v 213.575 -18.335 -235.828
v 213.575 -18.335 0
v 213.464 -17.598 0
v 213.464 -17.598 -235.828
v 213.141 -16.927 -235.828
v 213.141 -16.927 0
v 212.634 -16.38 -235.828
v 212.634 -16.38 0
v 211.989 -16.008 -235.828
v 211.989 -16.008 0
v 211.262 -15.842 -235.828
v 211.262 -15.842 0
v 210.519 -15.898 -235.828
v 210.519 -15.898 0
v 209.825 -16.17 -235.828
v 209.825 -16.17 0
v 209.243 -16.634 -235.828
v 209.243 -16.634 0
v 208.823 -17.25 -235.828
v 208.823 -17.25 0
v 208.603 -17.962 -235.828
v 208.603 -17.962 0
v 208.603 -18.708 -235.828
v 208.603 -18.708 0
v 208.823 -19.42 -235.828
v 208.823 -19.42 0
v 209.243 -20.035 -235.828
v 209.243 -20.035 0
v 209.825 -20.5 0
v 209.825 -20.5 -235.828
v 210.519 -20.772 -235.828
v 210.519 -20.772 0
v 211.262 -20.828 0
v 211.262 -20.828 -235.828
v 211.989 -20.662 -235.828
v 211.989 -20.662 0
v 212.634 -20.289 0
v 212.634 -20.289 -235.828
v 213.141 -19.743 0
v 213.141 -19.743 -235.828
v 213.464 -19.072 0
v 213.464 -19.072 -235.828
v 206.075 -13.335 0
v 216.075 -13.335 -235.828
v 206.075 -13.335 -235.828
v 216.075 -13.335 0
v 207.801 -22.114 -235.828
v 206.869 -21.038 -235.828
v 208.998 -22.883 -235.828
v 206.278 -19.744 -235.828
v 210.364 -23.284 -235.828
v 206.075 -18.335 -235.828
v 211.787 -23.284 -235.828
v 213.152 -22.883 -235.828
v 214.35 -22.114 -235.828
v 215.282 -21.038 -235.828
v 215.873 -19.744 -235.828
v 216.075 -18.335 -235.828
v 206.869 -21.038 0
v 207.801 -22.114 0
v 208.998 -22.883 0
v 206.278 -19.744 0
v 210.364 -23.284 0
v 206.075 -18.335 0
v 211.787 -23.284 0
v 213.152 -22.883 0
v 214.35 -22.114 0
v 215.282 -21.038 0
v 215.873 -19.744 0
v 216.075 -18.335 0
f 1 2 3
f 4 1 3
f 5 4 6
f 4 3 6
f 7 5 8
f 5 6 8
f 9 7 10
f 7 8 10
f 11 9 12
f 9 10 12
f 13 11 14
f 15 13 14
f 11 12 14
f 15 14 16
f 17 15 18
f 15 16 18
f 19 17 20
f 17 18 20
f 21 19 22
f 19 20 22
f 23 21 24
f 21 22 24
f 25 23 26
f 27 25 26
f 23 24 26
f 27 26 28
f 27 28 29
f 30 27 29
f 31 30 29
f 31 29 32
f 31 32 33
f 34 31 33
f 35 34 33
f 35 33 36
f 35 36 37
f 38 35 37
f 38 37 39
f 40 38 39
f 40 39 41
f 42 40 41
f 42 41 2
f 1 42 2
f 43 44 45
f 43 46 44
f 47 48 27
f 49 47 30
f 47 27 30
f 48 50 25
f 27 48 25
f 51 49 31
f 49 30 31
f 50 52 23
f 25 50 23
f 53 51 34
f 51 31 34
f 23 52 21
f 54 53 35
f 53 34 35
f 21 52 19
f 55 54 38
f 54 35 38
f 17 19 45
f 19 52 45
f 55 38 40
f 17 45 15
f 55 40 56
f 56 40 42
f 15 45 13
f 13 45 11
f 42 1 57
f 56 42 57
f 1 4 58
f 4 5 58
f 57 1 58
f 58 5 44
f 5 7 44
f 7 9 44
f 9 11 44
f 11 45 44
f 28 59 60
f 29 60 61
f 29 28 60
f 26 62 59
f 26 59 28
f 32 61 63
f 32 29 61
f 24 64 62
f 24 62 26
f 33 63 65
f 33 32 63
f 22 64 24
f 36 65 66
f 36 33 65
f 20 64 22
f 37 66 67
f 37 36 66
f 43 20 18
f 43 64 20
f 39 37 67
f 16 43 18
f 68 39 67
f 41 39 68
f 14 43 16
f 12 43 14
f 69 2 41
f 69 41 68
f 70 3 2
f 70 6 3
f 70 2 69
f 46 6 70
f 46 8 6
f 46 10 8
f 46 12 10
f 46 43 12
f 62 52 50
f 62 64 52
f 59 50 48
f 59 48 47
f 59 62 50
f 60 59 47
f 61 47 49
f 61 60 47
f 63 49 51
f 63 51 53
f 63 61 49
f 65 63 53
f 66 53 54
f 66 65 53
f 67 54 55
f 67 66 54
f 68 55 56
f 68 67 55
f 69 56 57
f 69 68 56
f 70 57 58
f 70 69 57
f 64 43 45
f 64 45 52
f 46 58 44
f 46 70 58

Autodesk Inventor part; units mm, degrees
ref_plane "YZ Plane" through (0, 0, 0) normal (1, 0, 0) x (0, 1, 0)
ref_plane "XZ Plane" through (0, 0, 0) normal (0, 1, 0) x (-1, 0, 0)
ref_plane "Work Plane1" through (0, 0, 0) normal (0, 0, 1) x (1, 0, 0)
sketch "Sketch1" plane through (0, 0, 0) normal (0, 0, 1) x (1, 0, 0)
  line L0 (28.2, -13.1349) -> (28.2, -18.3349) projected
  arc A0 (17.8, -18.3349) -> (28.2, -18.3349) centre (23, -18.3349) ccw projected
  line L1 (17.8, -18.3349) -> (17.8, -13.1349) projected
  line L2 (17.8, -13.1349) -> (28.2, -13.1349) projected
  line L3 (205.8753, -18.3349) -> (205.8753, -13.1349) projected
  line L4 (205.8753, -13.1349) -> (216.2753, -13.1349) projected
  line L5 (216.2753, -13.1349) -> (216.2753, -18.3349) projected
  arc A1 (205.8753, -18.3349) -> (216.2753, -18.3349) centre (211.0753, -18.3349) ccw projected
  line L6 (226.007, -27.5) -> (182.0614, -27.5) projected
  line L7 (226.007, 5) -> (226.007, -27.5) projected
  line L8 (14, 5) -> (226.007, 5) projected
  line L9 (14, -27.5) -> (14, 5) projected
  line L10 (52.5458, -27.5) -> (14, -27.5) projected
  line L11 (105.8221, -25.5) -> (103.8221, -27.5) projected
  line L12 (105.8221, -25.5) -> (105.8221, -8.9699) projected
  line L13 (105.8221, -8.9699) -> (111.2221, -8.9699) projected
  line L14 (111.2221, -8.9699) -> (111.2221, -25.5) projected
  line L15 (113.2221, -27.5) -> (111.2221, -25.5) projected
  line L16 (151.8, -27.5) -> (113.2221, -27.5) projected
  line L17 (153.8, -25.5) -> (151.8, -27.5) projected
  line L18 (153.8, -25.5) -> (153.8, -8.9699) projected
  line L19 (153.8, -8.9699) -> (159.2, -8.9699) projected
  line L20 (159.2, -8.9699) -> (159.2, -19.6294) projected
  line L21 (216.0753, -18.3349) -> (216.0753, -13.3349)
  line L22 (216.0753, -13.3349) -> (206.0753, -13.3349)
  line L23 (206.0753, -13.3349) -> (206.0753, -18.3349)
  arc A2 (206.0753, -18.3349) -> (216.0753, -18.3349) centre (211.0753, -18.3349) ccw
  circle A3 centre (211.0753, -18.3349) radius 2.5
  line L24 (182.0614, -27.0054) -> (182.0614, -27.5) projected
  line L25 (52.5458, -27.5) -> (52.5458, -27.003) projected
  line L26 (52.5458, -27.003) -> (55.9407, -27.003) projected
  arc A4 (55.9407, -27.003) -> (66.5602, -14.9102) centre (55.9407, -16.2937) ccw projected
  line L27 (66.5602, -14.9102) -> (70.1135, -14.9102) projected
  line L28 (70.1135, -14.9102) -> (75.8231, -20.6198) projected
  arc A5 (72.9244, -27.5) -> (75.8231, -20.6198) centre (55.9407, -16.2937) ccw projected
  line L29 (103.8221, -27.5) -> (72.9244, -27.5) projected
  line L30 (159.2, -19.6294) -> (164.284, -14.5322) projected
  line L31 (164.284, -14.5322) -> (168.2242, -14.5271) projected
  arc A6 (168.2242, -14.5271) -> (178.6664, -27.0054) centre (178.6664, -16.397) ccw projected
  line L32 (178.6664, -27.0054) -> (182.0614, -27.0054) projected
  circle A7 centre (55.9407, -16.2937) radius 1.5 projected
  circle A8 centre (178.6664, -16.397) radius 1.5 projected
  point P0 (0, 0)
  dimension "d0" = 0.2
  dimension "d1" = 5
ref_plane "Work Plane2" through (14, -27.5, -235.8278) normal (0, 0, -1) x (0, 1, 0)
extrude "Extrusion1" add sketch "Sketch1" against normal up to surface (235.8278 mm away) contours A2 L23 L22 L21
properties part number "BaseShaft_3DPrint"
